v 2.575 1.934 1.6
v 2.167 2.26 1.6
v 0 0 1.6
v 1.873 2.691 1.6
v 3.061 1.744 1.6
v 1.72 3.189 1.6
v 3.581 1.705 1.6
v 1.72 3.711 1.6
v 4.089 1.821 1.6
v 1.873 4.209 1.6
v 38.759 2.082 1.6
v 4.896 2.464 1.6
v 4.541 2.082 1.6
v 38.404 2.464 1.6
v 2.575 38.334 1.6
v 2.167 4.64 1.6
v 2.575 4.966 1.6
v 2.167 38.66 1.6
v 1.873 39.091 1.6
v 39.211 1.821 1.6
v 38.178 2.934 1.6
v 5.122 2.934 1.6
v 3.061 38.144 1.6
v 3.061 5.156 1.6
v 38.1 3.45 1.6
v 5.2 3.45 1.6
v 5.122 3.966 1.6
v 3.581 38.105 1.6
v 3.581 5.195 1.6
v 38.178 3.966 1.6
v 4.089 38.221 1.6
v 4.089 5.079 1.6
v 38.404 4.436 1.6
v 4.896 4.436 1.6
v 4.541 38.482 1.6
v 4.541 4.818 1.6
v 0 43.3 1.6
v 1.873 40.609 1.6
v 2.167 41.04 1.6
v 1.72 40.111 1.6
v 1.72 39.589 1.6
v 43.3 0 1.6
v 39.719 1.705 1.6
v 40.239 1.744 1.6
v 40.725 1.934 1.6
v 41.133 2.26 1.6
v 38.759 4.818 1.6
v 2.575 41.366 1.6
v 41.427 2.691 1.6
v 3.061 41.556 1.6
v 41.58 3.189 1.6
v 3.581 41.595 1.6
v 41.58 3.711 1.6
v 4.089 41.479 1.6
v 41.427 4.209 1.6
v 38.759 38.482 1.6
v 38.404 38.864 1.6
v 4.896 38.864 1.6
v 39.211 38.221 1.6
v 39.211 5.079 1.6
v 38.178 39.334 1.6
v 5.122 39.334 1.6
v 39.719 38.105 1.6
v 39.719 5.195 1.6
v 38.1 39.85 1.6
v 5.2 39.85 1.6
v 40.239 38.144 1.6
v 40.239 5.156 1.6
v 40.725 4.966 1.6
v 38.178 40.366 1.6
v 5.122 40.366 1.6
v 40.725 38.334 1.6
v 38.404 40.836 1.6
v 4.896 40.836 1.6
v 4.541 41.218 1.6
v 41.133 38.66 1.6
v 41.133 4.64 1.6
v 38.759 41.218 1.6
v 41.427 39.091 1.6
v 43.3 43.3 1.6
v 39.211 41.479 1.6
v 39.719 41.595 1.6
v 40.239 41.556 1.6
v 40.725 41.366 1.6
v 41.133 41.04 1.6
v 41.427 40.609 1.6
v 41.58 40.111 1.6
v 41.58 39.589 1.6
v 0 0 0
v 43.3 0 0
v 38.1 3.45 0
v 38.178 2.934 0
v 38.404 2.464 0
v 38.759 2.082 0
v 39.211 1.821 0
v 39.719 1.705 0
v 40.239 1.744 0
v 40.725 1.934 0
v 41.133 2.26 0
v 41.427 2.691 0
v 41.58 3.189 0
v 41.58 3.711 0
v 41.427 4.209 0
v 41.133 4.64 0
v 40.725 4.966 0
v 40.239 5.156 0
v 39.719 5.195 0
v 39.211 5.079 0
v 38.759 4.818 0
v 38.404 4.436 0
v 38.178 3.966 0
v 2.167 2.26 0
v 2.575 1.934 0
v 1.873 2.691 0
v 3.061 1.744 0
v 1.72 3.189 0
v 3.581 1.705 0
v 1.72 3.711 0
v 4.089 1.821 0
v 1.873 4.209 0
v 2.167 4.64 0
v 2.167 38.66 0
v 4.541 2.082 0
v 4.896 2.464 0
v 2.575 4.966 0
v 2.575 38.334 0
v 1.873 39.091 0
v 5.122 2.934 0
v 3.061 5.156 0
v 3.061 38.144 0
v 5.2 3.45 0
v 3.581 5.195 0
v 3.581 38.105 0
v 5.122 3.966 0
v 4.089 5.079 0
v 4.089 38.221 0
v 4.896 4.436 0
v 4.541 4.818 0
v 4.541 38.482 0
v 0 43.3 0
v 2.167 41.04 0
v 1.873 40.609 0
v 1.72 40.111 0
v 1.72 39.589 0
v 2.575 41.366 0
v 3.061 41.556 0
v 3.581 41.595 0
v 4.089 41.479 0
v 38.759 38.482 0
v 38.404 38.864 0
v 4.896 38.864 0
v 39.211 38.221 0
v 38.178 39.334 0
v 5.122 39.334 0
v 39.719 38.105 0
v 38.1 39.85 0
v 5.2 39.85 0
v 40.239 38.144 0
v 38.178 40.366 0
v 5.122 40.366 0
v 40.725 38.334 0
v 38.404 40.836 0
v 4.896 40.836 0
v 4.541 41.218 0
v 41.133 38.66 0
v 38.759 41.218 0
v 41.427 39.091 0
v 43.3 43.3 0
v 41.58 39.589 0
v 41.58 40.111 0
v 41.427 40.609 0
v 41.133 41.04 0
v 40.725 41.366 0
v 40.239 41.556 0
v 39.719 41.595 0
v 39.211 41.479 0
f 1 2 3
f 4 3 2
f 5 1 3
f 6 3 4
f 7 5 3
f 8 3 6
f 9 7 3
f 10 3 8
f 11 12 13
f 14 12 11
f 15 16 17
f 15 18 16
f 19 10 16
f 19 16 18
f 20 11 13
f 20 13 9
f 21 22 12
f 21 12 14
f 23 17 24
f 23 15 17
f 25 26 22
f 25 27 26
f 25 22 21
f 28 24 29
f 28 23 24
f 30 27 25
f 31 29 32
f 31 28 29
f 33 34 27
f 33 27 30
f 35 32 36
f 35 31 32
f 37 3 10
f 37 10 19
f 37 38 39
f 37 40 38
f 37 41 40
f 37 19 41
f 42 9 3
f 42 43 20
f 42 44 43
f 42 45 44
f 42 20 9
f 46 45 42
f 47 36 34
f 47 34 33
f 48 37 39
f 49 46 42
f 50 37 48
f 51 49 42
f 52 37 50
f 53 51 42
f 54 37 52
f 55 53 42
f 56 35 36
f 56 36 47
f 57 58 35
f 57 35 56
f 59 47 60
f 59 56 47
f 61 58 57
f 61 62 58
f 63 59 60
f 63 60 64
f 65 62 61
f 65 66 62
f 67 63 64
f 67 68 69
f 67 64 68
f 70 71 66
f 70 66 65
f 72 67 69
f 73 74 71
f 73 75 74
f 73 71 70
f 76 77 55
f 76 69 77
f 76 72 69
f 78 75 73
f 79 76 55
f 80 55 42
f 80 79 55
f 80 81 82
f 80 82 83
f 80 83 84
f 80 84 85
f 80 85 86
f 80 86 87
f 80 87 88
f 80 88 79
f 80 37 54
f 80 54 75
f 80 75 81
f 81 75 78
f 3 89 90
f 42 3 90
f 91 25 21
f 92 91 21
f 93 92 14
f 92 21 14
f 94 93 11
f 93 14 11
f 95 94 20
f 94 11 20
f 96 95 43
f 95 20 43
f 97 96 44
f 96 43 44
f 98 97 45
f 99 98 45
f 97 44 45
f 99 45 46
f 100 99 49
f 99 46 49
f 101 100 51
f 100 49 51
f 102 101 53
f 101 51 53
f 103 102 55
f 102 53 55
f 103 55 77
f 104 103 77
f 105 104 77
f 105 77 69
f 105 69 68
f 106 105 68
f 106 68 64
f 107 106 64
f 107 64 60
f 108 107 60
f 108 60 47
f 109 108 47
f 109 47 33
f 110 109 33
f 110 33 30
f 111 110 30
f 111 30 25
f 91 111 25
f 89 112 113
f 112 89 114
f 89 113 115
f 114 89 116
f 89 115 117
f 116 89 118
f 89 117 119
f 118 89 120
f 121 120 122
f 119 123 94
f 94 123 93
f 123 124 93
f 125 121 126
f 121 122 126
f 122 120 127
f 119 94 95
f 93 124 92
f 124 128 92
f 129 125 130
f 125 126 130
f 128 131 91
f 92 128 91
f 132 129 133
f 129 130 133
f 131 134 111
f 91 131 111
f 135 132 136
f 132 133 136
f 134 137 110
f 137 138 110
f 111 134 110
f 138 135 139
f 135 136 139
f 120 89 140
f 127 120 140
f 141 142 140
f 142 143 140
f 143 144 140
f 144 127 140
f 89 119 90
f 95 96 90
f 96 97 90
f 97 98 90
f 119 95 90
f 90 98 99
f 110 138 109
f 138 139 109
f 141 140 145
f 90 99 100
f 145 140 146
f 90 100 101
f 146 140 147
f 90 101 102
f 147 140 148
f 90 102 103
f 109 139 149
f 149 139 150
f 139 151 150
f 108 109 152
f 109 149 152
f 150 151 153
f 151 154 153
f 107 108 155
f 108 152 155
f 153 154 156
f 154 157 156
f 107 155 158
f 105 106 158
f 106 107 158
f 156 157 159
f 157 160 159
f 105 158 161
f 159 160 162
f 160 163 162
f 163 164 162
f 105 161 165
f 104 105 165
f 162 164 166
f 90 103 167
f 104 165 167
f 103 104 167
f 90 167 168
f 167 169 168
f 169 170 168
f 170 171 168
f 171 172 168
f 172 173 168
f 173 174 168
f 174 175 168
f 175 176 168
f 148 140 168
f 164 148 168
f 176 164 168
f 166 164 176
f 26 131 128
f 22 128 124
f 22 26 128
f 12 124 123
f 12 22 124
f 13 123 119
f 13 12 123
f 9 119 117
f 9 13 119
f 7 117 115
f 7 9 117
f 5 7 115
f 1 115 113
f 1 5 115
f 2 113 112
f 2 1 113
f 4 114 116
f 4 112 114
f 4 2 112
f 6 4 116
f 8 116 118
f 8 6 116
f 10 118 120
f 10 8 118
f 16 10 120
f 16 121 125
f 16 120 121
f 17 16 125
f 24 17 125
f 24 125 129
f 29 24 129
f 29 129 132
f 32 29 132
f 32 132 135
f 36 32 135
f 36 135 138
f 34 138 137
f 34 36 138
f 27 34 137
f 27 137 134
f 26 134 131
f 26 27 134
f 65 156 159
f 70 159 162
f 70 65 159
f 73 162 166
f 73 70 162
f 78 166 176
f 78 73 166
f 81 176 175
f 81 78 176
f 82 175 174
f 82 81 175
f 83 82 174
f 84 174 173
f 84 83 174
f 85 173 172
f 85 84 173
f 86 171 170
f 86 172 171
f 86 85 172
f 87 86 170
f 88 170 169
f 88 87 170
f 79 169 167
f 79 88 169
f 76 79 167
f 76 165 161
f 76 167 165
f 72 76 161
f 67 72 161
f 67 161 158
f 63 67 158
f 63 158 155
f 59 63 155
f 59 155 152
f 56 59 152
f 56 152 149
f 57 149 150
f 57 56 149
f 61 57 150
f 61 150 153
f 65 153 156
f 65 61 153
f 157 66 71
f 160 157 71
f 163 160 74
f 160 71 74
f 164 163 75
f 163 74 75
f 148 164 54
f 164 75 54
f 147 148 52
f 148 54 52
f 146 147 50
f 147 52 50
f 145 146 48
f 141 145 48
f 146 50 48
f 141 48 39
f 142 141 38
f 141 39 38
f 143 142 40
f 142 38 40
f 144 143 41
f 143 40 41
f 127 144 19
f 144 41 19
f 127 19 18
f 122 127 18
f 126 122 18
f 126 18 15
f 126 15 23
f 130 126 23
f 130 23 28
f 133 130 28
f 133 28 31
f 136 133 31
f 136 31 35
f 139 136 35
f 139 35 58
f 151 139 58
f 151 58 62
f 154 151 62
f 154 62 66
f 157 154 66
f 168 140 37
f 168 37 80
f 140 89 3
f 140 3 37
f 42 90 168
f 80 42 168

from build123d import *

# Parameters (mm, degrees)
ESQUISSE1_W               = 43.3
ESQUISSE1_H               = 43.3
BOSS_EXTRU_1_DEPTH        = 1.6
ESQUISSE2_R               = 1.75
ENL_V_MAT_EXTRU_1_DEPTH   = 62.25634661
SYM_TRIE2_COPY_1_SKETCH_R = 1.75
SYM_TRIE2_COPY_1_DEPTH    = 62.25634661


with BuildPart() as part:
    # Esquisse1 → Boss.-Extru.1 (new body)
    with BuildSketch(Plane.XY):
        with Locations((21.65, 21.65)):
            Rectangle(ESQUISSE1_W, ESQUISSE1_H)
    extrude(amount=BOSS_EXTRU_1_DEPTH)

    # Esquisse2 → Enlèv. mat.-Extru.1 (cut, through all)
    with BuildSketch(Plane.XY.offset(1.6)):
        with Locations((3.45, 39.85)):
            Circle(ESQUISSE2_R)
    enl_v_mat_extru_1 = extrude(amount=-ENL_V_MAT_EXTRU_1_DEPTH, mode=Mode.SUBTRACT)

    # Symétrie1: Enlèv. mat.-Extru.1 across plane
    add(enl_v_mat_extru_1.mirror(Plane.ZY.offset(-21.65)), mode=Mode.SUBTRACT)

    # Symétrie2: Enlèv. mat.-Extru.1 across plane
    add(enl_v_mat_extru_1.mirror(Plane.ZX.offset(21.65)), mode=Mode.SUBTRACT)

    # Symétrie2 copy 1 sketch → Symétrie2 copy 1 (cut, through all)
    with BuildSketch(Plane(origin=(43.3, 43.3, 1.6), x_dir=(-1, 0, 0), z_dir=(0, 0, 1))):
        with Locations((3.45, 39.85)):
            Circle(SYM_TRIE2_COPY_1_SKETCH_R)
    extrude(amount=-SYM_TRIE2_COPY_1_DEPTH, mode=Mode.SUBTRACT)


solid = part.part
